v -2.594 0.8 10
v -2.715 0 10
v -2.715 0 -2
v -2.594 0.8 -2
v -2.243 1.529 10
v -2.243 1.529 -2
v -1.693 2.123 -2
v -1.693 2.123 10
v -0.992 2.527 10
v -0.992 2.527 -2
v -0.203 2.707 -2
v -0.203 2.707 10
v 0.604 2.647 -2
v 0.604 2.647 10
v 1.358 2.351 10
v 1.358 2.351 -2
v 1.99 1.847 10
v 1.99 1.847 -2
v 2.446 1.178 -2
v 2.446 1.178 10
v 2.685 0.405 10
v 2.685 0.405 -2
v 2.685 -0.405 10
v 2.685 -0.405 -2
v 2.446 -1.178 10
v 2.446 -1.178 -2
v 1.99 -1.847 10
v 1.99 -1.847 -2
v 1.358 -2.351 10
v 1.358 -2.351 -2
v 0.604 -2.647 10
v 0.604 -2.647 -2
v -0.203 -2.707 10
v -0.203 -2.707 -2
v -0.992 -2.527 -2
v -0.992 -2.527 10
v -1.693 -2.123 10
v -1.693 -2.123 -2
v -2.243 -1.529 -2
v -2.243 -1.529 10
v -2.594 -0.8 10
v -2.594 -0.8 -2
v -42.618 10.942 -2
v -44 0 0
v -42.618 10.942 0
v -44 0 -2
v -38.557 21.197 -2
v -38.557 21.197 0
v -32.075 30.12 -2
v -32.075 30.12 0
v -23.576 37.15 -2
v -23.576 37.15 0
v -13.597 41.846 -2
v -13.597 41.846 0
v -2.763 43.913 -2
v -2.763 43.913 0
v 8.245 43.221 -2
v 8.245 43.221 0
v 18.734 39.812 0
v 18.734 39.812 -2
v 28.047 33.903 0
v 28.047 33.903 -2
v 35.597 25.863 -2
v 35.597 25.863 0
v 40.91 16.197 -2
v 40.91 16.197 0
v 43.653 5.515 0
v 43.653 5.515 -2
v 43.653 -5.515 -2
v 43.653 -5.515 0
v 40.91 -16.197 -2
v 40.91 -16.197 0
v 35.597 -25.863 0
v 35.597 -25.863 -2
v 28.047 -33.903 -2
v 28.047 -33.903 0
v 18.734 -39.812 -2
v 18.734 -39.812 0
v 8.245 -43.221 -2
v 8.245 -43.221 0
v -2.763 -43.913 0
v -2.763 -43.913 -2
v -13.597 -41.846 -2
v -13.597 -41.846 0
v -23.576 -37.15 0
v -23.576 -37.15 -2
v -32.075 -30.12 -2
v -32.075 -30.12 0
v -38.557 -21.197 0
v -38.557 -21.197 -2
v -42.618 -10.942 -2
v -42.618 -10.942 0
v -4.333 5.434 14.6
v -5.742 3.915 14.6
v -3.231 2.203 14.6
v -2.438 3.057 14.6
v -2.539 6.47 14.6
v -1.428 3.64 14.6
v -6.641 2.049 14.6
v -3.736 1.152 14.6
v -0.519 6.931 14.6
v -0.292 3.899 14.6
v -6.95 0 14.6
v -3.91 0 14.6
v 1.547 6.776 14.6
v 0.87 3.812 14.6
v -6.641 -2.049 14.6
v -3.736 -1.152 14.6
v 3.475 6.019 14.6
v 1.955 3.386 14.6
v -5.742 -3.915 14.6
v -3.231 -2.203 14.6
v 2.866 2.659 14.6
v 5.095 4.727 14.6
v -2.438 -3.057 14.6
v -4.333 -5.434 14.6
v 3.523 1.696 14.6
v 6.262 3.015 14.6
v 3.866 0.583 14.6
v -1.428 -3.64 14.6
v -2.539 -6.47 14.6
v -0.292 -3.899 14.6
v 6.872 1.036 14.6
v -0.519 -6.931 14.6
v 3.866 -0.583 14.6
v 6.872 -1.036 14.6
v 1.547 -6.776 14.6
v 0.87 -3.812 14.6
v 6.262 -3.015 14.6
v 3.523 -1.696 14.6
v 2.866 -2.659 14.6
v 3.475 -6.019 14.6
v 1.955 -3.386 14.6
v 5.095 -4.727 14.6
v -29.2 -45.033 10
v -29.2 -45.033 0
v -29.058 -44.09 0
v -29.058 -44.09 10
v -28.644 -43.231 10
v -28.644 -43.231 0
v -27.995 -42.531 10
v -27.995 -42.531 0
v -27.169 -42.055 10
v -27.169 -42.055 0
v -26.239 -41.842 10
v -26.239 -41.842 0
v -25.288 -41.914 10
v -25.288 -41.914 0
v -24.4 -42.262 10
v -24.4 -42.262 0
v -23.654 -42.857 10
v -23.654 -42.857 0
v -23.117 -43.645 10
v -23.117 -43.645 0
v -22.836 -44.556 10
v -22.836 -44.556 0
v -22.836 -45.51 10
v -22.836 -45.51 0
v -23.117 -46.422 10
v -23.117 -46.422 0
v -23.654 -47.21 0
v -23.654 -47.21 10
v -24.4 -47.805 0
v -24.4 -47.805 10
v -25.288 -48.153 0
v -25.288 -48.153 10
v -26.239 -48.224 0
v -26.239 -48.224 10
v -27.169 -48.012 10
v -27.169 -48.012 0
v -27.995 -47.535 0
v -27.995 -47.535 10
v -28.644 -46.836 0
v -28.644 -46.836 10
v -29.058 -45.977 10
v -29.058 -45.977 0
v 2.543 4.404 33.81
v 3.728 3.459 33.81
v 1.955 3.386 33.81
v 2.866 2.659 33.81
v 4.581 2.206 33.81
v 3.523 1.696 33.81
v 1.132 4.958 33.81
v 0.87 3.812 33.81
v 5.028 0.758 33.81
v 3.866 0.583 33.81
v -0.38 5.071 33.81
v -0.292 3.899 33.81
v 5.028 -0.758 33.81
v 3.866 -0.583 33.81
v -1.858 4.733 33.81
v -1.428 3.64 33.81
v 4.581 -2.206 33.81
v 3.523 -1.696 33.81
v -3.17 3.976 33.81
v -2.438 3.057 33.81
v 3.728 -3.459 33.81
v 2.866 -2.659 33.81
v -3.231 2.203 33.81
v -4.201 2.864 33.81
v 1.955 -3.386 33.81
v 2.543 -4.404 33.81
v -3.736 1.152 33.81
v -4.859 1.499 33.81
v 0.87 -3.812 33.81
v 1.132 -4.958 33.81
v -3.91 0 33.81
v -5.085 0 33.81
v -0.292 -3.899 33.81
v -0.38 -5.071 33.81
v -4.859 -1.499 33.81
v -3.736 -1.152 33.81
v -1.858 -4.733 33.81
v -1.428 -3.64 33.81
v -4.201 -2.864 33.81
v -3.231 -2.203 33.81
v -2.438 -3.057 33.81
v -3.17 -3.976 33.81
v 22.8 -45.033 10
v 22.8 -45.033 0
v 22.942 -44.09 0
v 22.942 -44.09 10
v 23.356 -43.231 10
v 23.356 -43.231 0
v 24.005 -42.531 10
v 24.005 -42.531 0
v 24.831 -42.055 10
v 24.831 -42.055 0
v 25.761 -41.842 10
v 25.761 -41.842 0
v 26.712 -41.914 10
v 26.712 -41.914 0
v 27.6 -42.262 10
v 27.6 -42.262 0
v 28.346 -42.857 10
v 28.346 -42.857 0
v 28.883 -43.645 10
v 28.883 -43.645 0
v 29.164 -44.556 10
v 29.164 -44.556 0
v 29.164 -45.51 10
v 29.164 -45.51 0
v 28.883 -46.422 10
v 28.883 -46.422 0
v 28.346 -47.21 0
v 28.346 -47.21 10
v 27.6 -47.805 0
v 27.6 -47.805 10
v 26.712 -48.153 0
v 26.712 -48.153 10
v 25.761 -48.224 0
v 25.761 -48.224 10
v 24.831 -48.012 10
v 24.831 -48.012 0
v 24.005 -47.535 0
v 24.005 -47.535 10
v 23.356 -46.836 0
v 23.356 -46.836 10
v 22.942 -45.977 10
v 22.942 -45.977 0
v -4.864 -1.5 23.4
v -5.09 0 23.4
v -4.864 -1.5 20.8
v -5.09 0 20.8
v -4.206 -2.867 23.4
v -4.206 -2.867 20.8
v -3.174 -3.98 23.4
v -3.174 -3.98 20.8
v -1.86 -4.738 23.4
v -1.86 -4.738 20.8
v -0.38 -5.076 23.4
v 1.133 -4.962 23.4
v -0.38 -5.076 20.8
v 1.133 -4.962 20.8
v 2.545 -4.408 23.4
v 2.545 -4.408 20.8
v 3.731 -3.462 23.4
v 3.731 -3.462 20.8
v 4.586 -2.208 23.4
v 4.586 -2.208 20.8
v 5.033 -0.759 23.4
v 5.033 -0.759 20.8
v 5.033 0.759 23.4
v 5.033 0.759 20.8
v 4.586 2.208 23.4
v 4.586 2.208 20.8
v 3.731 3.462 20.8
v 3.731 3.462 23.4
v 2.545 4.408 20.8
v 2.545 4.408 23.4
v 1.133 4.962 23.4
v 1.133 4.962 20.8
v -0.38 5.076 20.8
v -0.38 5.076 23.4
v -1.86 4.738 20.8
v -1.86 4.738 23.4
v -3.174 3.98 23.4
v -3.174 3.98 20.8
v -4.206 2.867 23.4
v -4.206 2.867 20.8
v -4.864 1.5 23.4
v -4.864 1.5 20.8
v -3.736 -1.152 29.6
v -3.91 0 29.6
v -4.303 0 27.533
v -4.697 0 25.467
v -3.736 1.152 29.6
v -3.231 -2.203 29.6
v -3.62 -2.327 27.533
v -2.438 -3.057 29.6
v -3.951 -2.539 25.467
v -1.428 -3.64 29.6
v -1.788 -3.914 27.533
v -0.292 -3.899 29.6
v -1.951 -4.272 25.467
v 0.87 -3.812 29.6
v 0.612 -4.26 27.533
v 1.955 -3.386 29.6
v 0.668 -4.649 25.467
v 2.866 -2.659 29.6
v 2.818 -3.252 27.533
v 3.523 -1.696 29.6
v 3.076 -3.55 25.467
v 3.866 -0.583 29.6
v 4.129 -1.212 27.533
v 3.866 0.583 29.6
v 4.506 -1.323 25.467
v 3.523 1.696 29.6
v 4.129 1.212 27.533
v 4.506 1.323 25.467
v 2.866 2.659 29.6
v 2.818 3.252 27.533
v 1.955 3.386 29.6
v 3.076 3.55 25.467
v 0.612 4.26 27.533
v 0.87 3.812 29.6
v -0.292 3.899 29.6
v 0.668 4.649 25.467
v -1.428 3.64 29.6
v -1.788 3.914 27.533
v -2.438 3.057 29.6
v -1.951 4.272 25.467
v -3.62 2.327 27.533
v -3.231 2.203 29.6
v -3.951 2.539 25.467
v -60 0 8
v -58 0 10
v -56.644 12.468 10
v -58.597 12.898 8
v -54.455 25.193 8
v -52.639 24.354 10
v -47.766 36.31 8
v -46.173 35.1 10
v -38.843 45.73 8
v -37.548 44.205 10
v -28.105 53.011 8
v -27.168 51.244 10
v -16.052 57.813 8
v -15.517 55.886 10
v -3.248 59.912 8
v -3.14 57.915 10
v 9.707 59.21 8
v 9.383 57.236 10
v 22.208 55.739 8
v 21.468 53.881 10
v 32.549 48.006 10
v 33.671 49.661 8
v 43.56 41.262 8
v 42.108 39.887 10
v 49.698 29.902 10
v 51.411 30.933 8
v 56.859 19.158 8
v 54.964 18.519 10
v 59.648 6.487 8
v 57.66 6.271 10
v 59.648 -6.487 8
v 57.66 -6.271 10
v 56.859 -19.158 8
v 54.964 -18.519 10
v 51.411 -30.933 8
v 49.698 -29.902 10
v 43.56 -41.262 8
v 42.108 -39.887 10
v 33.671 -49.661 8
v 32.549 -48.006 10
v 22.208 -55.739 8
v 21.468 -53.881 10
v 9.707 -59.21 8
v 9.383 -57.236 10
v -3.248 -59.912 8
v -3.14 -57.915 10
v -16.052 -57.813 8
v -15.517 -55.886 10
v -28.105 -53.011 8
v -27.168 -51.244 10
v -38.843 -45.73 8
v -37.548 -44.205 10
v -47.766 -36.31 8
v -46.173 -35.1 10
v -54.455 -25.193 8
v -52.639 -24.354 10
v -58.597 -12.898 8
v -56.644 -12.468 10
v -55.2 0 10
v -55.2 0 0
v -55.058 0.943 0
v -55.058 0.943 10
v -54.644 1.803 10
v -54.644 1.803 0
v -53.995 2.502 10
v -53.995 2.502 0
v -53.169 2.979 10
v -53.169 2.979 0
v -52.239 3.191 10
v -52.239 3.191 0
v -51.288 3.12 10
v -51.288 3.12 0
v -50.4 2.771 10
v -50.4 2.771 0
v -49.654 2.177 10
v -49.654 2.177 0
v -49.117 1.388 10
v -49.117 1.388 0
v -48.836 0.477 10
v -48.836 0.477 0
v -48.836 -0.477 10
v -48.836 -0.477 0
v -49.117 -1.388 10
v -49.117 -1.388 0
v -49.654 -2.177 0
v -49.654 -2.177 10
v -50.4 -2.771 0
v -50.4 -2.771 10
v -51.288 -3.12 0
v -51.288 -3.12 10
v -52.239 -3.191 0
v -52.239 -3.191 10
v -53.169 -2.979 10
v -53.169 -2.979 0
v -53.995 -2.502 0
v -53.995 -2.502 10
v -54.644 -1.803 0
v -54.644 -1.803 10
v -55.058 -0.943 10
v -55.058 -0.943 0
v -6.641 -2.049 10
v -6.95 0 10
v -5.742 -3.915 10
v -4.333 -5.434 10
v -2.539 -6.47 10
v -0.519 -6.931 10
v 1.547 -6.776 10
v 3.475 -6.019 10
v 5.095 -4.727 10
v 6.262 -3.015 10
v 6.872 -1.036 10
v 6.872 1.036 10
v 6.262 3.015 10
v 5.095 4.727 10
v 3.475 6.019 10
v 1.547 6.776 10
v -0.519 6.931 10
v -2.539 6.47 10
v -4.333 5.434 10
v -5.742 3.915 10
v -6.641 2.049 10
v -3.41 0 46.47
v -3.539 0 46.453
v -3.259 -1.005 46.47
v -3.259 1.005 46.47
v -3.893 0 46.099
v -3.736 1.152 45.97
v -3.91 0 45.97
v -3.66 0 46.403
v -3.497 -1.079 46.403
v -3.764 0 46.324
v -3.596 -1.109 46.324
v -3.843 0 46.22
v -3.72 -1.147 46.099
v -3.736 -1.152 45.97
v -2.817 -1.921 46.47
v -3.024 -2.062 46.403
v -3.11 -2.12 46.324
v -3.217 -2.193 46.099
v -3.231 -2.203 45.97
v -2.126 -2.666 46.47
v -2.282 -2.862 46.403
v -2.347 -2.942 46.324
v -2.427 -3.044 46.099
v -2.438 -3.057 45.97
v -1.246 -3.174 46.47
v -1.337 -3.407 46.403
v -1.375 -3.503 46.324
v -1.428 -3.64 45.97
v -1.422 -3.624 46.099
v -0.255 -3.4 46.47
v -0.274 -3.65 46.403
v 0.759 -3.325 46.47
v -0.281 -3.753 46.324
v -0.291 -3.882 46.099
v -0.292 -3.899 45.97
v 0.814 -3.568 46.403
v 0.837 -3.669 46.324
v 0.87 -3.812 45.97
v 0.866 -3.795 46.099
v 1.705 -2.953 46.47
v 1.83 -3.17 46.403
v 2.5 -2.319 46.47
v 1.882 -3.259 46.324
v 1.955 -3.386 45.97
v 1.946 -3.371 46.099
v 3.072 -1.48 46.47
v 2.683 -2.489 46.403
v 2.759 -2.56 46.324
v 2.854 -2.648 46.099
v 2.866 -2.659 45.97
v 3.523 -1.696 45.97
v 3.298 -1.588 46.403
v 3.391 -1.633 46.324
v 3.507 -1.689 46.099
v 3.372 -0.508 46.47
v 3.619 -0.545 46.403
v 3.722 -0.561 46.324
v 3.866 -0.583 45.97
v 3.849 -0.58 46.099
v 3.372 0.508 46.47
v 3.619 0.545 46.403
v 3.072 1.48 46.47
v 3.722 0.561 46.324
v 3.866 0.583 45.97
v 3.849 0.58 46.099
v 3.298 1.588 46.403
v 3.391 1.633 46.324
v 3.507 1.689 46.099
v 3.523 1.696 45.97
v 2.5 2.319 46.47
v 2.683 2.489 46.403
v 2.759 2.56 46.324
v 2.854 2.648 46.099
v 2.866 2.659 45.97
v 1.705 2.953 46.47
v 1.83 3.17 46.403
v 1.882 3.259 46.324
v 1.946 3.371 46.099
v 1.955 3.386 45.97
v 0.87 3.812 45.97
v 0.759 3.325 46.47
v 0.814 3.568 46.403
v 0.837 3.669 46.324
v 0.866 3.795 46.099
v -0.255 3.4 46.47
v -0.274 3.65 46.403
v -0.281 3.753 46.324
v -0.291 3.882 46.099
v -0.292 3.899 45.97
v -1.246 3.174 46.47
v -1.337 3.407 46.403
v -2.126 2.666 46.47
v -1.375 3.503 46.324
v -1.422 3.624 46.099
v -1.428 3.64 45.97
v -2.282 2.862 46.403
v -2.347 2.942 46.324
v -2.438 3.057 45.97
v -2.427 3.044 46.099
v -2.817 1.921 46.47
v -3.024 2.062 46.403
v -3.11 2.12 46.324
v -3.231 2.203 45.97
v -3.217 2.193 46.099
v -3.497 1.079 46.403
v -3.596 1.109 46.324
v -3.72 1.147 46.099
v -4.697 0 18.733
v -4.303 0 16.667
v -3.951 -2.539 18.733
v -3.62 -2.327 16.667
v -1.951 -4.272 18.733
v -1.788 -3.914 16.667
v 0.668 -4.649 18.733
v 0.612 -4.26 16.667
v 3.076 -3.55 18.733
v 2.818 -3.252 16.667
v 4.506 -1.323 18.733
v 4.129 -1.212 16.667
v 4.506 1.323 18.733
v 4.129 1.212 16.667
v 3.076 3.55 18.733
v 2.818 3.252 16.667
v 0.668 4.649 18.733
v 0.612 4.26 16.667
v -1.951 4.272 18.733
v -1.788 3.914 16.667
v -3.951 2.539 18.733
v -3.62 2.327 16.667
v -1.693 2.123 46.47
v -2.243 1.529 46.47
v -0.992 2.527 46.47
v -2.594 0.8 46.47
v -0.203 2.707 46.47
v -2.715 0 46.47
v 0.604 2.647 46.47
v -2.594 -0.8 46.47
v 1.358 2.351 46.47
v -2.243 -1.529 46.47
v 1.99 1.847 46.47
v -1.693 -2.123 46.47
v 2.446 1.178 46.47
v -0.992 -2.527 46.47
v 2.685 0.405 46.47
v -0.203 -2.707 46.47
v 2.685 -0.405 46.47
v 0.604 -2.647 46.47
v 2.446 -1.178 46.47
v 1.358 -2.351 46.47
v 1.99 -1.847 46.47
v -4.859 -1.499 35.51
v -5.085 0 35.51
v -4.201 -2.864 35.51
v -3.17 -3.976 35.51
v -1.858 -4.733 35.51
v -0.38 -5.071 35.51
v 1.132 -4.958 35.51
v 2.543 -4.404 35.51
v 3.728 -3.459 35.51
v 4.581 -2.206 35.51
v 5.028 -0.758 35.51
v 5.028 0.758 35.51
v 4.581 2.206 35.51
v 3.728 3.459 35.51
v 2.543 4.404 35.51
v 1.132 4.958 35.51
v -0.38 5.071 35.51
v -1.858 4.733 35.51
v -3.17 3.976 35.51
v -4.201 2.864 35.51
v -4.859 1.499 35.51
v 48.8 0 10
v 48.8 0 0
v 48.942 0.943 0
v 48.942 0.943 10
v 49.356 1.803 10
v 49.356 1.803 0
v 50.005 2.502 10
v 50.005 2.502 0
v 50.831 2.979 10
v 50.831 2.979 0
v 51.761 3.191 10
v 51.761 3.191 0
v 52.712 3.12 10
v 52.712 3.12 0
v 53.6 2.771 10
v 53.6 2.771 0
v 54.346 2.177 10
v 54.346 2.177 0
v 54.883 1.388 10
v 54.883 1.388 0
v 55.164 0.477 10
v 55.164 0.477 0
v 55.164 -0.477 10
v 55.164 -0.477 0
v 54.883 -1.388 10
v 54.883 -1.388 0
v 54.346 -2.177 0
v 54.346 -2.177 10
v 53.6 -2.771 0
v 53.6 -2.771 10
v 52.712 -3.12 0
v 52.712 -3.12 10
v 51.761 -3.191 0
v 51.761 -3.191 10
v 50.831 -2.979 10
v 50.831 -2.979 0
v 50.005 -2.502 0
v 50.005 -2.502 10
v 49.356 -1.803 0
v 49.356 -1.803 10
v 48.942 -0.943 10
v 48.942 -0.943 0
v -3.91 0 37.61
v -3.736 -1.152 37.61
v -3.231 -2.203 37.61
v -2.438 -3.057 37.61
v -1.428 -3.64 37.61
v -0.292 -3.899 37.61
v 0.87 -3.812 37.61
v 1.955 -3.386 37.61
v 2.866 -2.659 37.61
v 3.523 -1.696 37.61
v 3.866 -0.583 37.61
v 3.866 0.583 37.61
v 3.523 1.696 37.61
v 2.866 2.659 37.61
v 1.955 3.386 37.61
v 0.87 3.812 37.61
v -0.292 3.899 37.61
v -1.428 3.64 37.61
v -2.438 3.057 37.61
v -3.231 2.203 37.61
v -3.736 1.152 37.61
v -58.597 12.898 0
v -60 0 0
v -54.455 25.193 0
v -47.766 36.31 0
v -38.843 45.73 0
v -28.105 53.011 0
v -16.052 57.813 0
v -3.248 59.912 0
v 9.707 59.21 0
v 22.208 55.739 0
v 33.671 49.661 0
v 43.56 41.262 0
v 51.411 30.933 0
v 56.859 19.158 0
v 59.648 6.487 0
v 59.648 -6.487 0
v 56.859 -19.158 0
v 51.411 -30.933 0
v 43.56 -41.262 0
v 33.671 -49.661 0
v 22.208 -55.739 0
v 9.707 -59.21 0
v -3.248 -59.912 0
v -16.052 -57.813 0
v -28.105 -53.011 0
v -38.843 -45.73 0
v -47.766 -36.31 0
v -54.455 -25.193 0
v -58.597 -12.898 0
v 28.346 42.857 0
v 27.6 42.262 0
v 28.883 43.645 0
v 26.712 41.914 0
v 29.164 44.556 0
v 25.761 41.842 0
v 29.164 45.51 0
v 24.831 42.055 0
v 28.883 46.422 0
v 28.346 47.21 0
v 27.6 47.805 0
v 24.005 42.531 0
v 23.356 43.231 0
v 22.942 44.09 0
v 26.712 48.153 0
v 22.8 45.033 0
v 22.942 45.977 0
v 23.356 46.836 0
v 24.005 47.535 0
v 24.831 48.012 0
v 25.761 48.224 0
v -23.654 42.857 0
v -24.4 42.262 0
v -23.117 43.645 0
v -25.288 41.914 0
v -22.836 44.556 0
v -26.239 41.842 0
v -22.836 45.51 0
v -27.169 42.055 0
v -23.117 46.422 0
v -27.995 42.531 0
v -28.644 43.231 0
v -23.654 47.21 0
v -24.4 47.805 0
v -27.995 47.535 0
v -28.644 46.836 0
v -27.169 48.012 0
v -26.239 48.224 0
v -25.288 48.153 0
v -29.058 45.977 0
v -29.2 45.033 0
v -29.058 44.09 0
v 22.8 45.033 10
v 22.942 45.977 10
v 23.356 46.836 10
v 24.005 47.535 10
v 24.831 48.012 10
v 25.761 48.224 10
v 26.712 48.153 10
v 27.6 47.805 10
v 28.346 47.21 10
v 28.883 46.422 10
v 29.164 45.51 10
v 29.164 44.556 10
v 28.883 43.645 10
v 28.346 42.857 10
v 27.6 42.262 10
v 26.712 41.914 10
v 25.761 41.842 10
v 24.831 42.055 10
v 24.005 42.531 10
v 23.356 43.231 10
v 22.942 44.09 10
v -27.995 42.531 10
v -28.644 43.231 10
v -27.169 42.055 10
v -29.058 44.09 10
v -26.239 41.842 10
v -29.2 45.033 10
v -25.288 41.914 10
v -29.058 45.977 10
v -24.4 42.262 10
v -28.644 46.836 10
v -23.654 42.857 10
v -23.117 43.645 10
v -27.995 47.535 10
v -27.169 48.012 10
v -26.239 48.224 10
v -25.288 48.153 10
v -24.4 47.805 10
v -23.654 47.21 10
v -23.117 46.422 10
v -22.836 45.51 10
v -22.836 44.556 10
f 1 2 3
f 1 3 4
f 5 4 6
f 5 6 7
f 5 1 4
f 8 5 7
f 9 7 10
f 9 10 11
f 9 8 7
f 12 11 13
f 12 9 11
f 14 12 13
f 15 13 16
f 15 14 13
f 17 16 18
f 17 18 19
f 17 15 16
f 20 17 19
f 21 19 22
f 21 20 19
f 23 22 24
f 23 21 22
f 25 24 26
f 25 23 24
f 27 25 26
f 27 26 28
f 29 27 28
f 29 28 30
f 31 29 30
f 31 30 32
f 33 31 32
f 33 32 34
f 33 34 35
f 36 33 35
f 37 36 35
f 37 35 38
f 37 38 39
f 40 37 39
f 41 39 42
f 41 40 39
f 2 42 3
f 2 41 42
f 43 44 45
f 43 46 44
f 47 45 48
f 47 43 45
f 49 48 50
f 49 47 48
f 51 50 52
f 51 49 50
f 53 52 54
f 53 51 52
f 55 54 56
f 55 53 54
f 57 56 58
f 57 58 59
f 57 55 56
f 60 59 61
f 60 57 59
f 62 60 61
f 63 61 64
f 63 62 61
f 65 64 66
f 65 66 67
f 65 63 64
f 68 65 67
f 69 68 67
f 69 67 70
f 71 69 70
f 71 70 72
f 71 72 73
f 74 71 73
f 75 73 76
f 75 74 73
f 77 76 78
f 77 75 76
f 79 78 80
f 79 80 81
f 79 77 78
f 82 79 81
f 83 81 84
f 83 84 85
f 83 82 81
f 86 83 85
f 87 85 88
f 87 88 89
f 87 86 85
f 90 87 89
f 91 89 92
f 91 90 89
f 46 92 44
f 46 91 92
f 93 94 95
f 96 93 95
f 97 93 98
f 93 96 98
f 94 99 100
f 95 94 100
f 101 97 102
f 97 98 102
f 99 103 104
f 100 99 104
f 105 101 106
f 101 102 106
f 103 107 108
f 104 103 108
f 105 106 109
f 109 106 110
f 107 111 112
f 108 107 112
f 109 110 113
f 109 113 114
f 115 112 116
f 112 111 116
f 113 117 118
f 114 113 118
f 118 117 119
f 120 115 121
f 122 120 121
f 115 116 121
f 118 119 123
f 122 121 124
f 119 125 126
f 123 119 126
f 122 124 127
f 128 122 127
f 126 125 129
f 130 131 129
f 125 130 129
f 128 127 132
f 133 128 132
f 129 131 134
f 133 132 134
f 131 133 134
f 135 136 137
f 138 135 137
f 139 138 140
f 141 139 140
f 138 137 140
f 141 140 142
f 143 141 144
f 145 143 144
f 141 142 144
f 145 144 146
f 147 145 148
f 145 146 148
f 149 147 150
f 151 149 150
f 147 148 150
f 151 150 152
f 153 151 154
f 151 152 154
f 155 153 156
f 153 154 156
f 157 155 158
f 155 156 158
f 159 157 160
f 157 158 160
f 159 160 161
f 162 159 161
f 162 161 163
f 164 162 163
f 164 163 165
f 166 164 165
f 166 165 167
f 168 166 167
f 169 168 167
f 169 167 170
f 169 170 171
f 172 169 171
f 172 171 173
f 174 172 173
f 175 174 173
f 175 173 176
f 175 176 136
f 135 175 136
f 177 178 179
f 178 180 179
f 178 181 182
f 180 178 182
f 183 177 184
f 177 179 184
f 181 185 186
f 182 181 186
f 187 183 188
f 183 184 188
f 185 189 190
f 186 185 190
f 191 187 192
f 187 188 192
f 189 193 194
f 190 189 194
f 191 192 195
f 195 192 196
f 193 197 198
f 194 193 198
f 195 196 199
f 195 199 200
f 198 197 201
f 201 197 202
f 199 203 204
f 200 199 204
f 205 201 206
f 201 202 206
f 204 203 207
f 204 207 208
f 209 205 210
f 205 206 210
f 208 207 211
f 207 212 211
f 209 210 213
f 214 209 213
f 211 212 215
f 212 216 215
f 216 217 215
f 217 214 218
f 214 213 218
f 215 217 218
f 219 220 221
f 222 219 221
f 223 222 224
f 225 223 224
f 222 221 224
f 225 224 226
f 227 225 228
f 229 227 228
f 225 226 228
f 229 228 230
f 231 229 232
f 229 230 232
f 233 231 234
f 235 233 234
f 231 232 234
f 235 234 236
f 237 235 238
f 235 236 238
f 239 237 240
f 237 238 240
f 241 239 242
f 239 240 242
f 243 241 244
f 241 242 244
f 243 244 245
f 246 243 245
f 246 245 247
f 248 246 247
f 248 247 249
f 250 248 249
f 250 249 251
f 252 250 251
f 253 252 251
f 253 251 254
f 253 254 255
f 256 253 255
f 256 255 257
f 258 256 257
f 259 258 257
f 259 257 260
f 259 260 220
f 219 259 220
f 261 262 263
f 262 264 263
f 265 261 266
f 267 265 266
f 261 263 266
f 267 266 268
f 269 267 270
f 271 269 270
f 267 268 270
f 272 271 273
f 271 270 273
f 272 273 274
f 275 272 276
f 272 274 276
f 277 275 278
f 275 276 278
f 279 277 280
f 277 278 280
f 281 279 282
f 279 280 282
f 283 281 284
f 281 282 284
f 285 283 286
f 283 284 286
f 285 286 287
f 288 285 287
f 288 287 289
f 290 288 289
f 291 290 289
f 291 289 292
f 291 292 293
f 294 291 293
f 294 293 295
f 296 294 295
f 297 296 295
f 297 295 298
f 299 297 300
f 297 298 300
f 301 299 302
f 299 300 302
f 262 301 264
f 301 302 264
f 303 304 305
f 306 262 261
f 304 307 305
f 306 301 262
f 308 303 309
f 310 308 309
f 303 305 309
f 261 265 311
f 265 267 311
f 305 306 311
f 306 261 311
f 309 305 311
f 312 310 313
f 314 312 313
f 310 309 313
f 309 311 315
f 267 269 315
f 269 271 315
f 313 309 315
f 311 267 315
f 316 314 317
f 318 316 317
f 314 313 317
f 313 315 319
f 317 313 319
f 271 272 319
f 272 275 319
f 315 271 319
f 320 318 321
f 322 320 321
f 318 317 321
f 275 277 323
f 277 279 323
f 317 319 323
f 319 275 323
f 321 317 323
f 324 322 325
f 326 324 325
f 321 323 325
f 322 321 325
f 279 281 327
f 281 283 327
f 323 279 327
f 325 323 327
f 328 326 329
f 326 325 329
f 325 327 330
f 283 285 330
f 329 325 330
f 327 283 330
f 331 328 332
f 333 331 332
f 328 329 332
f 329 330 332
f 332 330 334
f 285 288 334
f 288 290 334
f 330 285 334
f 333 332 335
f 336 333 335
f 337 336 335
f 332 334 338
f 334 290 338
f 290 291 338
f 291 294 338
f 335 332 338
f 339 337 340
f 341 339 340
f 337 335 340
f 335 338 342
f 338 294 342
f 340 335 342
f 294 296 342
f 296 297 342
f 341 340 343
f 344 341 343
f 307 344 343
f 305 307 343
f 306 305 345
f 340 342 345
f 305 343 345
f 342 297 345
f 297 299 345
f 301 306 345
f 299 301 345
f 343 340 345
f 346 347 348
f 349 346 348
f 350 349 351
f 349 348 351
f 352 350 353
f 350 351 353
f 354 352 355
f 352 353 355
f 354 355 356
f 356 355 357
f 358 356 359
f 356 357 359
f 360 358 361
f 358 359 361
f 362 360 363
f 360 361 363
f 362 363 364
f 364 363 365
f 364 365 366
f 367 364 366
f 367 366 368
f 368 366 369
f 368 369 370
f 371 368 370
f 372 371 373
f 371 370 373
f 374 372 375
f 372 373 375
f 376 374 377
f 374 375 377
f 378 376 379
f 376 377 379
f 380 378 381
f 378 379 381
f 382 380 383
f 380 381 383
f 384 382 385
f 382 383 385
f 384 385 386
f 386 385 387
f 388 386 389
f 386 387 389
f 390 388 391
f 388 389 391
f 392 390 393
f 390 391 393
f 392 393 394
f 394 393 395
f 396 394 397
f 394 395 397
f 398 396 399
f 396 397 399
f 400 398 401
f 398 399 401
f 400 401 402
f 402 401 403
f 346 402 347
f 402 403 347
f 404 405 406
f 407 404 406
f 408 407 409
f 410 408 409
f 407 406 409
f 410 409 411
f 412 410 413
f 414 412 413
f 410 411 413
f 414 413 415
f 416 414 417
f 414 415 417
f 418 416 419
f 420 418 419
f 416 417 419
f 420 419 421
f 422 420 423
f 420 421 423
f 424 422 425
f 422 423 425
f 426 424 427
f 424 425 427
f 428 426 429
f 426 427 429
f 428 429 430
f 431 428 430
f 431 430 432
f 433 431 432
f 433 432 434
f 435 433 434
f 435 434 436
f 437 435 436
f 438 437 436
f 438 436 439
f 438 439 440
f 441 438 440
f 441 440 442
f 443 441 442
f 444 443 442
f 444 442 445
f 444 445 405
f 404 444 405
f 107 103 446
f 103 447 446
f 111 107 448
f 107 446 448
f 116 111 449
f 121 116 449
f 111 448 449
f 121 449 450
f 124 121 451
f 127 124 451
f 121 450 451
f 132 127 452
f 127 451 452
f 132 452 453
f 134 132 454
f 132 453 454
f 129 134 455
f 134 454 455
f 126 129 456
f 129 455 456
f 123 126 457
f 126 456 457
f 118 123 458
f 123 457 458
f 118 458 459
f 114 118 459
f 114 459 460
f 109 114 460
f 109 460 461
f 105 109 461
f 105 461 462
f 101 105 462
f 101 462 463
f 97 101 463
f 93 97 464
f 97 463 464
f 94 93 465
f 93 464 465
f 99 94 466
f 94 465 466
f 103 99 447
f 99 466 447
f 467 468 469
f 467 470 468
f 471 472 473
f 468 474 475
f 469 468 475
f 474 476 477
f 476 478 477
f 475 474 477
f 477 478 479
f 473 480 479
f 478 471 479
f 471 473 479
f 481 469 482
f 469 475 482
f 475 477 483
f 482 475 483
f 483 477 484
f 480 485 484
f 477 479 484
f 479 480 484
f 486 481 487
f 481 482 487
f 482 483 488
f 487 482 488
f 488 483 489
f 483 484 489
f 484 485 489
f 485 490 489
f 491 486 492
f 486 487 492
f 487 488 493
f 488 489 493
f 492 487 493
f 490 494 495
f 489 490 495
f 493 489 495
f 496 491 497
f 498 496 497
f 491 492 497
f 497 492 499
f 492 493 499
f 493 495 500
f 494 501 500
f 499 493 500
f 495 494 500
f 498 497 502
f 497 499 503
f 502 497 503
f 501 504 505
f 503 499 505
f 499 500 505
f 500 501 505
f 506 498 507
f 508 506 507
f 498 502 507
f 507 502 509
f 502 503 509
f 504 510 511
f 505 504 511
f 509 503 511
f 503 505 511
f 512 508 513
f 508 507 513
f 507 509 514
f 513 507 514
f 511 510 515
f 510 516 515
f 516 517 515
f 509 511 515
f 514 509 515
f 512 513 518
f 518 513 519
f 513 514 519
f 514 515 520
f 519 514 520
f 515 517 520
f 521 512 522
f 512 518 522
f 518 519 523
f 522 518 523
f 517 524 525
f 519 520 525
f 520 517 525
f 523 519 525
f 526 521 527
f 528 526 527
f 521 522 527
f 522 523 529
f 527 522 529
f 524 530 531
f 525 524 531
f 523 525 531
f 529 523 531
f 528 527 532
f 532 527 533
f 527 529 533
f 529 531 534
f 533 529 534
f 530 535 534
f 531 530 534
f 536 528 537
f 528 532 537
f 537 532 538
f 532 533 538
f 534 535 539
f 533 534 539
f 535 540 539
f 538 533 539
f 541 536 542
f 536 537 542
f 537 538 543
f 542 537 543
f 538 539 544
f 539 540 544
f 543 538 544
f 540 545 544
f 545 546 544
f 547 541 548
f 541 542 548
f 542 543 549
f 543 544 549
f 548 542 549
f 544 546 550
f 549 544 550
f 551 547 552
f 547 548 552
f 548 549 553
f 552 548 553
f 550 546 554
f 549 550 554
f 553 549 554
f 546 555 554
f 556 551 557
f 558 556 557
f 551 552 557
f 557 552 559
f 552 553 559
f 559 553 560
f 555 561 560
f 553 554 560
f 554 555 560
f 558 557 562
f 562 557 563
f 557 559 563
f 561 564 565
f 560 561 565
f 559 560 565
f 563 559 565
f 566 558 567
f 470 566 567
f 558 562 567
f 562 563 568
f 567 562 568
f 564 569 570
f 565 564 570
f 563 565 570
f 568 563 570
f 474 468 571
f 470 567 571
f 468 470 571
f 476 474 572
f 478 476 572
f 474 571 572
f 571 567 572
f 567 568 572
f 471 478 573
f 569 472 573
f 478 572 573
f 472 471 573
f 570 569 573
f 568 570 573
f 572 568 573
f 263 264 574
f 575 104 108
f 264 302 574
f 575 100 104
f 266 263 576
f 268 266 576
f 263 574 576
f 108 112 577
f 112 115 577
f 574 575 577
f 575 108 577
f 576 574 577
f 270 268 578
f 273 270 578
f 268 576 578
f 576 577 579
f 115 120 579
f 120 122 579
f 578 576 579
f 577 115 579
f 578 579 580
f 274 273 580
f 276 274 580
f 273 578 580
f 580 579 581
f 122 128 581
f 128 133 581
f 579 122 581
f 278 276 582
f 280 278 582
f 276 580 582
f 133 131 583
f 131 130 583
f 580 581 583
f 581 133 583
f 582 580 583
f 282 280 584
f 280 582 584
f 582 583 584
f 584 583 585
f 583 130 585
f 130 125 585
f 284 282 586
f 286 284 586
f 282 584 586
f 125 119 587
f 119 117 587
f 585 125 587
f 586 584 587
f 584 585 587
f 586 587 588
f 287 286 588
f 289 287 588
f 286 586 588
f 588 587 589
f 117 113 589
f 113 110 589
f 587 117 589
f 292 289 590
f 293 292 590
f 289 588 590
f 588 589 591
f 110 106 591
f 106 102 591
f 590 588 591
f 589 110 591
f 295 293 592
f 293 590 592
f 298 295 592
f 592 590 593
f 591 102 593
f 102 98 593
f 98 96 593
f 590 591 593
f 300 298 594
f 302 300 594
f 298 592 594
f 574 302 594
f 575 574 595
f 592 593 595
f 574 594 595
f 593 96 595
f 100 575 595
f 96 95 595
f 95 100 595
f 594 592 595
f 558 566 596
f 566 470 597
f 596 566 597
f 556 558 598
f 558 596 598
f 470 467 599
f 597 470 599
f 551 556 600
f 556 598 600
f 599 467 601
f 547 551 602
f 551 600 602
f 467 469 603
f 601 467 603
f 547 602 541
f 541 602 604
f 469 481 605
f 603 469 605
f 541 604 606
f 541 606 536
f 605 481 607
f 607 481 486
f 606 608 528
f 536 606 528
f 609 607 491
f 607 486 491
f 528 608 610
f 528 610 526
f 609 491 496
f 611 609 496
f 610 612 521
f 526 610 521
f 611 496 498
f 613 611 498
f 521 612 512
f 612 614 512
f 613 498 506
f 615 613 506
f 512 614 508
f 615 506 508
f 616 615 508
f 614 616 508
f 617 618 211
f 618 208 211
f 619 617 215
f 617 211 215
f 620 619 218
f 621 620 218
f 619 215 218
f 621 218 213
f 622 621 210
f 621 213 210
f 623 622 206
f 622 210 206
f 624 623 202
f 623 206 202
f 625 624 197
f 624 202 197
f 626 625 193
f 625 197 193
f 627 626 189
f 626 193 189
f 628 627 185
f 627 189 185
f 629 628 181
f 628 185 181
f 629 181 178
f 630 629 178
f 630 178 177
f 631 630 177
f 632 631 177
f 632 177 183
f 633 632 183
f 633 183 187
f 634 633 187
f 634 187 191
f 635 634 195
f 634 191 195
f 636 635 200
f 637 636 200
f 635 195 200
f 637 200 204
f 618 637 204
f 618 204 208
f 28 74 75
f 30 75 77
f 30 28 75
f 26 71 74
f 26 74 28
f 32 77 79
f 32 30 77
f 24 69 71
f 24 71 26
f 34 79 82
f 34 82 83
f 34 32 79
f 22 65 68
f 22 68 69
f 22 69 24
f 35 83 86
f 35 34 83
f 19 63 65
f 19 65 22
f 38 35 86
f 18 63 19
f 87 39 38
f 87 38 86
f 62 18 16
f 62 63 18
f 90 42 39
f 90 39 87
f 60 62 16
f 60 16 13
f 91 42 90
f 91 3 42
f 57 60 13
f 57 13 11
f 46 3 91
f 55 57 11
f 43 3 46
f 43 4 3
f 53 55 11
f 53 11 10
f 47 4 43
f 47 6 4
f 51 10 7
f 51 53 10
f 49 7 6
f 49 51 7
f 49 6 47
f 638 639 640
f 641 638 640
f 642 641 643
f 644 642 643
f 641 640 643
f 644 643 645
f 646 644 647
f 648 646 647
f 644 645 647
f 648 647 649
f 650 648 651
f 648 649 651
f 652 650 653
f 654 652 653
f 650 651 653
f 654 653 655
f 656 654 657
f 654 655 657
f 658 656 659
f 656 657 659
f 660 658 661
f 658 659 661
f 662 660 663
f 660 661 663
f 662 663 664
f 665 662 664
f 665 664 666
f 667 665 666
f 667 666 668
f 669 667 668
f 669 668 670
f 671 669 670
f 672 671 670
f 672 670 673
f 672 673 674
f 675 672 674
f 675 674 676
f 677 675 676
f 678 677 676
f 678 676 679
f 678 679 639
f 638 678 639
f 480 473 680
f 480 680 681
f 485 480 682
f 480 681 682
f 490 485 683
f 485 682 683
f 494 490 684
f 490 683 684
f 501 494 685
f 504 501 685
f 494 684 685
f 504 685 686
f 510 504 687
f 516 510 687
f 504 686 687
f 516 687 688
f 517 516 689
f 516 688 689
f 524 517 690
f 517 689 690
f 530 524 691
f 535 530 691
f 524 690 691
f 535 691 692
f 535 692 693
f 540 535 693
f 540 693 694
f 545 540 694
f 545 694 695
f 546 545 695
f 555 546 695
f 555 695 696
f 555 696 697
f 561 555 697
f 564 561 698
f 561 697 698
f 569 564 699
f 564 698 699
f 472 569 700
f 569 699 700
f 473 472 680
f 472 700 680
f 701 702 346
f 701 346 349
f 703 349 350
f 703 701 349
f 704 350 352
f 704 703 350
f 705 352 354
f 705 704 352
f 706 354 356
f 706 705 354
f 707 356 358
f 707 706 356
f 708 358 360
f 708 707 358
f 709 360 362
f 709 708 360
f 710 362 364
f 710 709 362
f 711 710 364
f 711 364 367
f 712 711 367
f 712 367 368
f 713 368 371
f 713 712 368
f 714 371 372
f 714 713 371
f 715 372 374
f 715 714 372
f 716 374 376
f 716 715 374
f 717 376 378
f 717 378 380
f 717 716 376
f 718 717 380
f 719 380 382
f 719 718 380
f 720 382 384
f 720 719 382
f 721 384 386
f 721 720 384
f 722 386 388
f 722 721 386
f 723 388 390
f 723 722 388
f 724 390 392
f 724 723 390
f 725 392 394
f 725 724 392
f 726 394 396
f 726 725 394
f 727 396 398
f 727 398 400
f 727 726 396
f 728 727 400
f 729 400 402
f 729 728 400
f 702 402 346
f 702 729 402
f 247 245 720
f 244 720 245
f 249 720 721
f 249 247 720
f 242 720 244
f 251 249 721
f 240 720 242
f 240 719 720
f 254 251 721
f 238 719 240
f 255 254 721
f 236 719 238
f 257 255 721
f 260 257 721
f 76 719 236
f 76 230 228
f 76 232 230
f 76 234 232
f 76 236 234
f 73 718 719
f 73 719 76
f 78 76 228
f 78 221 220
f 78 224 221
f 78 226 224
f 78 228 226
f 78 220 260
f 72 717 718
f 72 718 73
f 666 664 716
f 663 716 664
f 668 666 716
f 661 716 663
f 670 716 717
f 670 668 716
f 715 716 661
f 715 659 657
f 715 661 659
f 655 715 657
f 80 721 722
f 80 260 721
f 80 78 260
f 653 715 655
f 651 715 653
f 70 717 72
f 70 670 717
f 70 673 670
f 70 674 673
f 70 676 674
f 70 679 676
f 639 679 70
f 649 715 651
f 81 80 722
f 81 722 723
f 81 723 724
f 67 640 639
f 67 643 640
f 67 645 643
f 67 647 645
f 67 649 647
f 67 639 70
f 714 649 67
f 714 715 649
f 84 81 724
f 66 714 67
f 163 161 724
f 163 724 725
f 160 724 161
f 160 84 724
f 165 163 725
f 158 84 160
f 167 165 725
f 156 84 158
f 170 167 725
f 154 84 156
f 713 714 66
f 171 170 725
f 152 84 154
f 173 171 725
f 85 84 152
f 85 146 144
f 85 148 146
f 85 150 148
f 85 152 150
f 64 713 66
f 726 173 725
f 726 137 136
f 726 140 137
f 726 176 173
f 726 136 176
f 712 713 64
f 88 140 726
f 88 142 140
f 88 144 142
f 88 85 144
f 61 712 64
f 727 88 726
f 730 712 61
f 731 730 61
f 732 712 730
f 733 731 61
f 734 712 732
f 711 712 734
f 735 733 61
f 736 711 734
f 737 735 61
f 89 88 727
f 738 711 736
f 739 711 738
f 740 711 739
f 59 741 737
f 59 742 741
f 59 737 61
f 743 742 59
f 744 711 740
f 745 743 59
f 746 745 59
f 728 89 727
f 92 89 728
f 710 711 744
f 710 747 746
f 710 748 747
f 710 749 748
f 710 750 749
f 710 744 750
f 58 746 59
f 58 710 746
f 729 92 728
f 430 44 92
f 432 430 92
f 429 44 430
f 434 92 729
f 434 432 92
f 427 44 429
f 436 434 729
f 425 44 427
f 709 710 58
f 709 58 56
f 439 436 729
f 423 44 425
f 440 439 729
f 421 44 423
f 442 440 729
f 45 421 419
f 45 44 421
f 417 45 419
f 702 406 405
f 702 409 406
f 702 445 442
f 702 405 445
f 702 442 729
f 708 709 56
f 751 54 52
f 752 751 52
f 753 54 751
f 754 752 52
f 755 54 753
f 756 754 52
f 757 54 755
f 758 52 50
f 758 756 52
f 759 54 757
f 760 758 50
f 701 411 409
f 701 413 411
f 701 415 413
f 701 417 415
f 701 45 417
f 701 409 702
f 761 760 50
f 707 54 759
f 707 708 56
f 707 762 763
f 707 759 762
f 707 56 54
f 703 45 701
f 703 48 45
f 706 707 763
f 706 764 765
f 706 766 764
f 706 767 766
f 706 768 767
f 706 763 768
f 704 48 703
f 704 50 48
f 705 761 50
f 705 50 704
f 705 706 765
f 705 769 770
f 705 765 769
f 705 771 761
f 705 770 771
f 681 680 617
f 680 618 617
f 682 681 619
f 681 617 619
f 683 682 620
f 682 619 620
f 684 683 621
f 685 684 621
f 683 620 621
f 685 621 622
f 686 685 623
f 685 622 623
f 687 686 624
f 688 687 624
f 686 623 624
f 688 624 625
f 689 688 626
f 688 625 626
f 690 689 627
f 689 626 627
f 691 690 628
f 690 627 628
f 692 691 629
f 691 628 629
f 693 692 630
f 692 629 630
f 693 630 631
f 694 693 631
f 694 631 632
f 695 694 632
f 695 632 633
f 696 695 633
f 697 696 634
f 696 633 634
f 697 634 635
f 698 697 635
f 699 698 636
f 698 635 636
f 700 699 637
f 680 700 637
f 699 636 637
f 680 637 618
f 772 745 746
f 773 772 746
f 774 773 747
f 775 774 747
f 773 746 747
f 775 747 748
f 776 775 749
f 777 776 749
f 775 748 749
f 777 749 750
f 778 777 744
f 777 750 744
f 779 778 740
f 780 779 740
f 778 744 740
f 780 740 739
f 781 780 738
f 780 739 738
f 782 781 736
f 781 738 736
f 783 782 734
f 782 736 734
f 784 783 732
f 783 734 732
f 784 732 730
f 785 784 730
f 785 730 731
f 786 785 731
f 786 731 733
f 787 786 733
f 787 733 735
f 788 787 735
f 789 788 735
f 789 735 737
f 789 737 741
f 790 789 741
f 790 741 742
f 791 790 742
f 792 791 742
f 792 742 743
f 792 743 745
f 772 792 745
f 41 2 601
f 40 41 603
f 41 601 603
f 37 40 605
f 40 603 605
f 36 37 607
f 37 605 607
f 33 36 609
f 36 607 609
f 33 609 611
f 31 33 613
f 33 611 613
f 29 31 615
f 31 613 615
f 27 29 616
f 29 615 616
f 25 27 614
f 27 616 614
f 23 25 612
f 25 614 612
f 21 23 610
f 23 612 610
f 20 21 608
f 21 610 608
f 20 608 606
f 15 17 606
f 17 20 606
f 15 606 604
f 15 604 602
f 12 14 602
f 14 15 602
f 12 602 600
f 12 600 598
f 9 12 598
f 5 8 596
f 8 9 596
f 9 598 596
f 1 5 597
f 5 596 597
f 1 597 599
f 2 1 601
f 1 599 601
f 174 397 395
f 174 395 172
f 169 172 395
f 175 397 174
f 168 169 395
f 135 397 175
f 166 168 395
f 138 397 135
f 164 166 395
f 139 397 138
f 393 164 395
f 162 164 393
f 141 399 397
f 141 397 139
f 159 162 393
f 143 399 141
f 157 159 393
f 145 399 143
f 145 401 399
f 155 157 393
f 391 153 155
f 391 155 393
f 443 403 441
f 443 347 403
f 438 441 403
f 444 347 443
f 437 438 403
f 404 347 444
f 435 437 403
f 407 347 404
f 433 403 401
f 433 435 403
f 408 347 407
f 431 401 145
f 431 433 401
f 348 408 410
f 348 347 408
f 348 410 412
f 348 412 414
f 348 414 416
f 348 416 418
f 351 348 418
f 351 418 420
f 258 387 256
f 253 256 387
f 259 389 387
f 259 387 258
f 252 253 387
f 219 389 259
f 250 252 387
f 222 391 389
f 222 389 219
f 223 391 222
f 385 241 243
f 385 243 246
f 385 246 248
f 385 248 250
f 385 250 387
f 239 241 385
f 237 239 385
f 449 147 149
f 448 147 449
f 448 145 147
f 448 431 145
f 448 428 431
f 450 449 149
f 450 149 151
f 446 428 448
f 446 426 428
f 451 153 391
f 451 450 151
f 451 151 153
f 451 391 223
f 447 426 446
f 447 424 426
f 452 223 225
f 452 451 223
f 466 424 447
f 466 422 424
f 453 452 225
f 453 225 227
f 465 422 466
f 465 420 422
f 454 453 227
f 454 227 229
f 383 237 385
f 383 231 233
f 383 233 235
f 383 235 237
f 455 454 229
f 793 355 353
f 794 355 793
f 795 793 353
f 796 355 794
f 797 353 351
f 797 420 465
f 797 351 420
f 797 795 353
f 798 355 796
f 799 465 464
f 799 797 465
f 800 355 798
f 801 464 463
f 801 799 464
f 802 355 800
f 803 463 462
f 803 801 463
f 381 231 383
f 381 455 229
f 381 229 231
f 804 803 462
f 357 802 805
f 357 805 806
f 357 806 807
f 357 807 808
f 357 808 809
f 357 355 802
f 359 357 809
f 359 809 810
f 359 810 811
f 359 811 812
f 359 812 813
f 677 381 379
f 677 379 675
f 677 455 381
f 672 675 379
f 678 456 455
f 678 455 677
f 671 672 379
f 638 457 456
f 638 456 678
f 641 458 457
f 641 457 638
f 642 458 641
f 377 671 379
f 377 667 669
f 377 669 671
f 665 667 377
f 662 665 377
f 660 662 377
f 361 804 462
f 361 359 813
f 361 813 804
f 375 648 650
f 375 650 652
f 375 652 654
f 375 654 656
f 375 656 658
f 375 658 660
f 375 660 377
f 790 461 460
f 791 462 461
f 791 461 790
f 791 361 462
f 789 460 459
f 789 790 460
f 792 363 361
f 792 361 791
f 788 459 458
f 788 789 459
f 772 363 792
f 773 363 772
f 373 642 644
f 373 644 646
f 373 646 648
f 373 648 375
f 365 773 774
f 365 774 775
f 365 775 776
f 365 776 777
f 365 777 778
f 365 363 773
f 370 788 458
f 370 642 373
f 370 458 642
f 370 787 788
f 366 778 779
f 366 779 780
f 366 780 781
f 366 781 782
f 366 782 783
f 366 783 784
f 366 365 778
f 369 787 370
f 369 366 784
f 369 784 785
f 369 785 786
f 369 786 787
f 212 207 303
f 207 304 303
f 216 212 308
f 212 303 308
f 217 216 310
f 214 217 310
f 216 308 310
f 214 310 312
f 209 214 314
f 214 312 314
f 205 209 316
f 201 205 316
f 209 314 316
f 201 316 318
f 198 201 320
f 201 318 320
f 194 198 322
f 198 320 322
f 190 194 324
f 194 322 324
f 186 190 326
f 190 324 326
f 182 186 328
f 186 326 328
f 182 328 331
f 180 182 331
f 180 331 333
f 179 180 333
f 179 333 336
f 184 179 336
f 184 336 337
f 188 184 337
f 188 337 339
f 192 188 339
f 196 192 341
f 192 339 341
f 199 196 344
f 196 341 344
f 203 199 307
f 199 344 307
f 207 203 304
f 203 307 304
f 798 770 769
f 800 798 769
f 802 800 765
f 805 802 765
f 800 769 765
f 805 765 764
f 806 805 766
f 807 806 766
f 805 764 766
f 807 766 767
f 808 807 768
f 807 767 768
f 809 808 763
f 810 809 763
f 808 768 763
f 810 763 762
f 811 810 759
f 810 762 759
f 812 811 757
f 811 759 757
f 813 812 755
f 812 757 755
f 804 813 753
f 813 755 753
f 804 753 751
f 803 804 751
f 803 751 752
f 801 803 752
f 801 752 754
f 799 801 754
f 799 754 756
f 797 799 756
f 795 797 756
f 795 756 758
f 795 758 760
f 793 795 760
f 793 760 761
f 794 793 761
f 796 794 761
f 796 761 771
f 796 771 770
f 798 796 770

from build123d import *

# Parameters (mm, degrees)
F4_D    = 6.4
F5_SIZE = 2


with BuildPart() as f1:
    # F0 (on Front) → F1 (revolve)
    with BuildSketch(Plane.XZ):
        Polygon((-44, 0), (-44, -2), (-2.715, -2), (-2.715, 10), (-60, 10), (-60, 0), align=None)
    revolve(axis=Axis((0, 0, 2.463164), (0, 0, -1)))

    # F4 (through all)
    with Locations(Plane.XY.offset(10)):
        with Locations((-26, 45.033321), (-52, 0), (-26, -45.033321), (26, -45.033321), (52, 0), (26, 45.033321)):
            Hole(F4_D / 2)

    # F5
    f5_edges = [f1.edges().sort_by_distance(p)[0] for p in [
        (60, 0, 10),
    ]]
    chamfer(f5_edges, length=F5_SIZE)

    # F6 (on Front) → F7 (revolve)
    with BuildSketch(Plane.XZ):
        with BuildLine():
            Line((-3.91, 45.97), (-3.91, 37.61))
            Line((-3.91, 37.61), (-5.085, 35.51))
            Line((-5.085, 35.51), (-5.085, 33.81))
            Line((-5.085, 33.81), (-3.91, 33.81))
            Line((-3.91, 33.81), (-3.91, 29.6))
            Line((-3.91, 29.6), (-5.09, 23.4))
            Line((-5.09, 23.4), (-5.09, 20.8))
            Line((-5.09, 20.8), (-3.91, 14.6))
            Line((-3.91, 14.6), (-6.95, 14.6))
            Line((-6.95, 14.6), (-6.95, 10))
            Line((-6.95, 10), (-2.715, 10))
            Line((-2.715, 10), (-2.715, 46.47))
            Line((-2.715, 46.47), (-3.41, 46.47))
            ThreePointArc((-3.41, 46.47), (-3.763553, 46.323553), (-3.91, 45.97))
        make_face()
    revolve(axis=Axis((0, 0, 24.371663), (0, 0, 1)))


solid = f1.part
